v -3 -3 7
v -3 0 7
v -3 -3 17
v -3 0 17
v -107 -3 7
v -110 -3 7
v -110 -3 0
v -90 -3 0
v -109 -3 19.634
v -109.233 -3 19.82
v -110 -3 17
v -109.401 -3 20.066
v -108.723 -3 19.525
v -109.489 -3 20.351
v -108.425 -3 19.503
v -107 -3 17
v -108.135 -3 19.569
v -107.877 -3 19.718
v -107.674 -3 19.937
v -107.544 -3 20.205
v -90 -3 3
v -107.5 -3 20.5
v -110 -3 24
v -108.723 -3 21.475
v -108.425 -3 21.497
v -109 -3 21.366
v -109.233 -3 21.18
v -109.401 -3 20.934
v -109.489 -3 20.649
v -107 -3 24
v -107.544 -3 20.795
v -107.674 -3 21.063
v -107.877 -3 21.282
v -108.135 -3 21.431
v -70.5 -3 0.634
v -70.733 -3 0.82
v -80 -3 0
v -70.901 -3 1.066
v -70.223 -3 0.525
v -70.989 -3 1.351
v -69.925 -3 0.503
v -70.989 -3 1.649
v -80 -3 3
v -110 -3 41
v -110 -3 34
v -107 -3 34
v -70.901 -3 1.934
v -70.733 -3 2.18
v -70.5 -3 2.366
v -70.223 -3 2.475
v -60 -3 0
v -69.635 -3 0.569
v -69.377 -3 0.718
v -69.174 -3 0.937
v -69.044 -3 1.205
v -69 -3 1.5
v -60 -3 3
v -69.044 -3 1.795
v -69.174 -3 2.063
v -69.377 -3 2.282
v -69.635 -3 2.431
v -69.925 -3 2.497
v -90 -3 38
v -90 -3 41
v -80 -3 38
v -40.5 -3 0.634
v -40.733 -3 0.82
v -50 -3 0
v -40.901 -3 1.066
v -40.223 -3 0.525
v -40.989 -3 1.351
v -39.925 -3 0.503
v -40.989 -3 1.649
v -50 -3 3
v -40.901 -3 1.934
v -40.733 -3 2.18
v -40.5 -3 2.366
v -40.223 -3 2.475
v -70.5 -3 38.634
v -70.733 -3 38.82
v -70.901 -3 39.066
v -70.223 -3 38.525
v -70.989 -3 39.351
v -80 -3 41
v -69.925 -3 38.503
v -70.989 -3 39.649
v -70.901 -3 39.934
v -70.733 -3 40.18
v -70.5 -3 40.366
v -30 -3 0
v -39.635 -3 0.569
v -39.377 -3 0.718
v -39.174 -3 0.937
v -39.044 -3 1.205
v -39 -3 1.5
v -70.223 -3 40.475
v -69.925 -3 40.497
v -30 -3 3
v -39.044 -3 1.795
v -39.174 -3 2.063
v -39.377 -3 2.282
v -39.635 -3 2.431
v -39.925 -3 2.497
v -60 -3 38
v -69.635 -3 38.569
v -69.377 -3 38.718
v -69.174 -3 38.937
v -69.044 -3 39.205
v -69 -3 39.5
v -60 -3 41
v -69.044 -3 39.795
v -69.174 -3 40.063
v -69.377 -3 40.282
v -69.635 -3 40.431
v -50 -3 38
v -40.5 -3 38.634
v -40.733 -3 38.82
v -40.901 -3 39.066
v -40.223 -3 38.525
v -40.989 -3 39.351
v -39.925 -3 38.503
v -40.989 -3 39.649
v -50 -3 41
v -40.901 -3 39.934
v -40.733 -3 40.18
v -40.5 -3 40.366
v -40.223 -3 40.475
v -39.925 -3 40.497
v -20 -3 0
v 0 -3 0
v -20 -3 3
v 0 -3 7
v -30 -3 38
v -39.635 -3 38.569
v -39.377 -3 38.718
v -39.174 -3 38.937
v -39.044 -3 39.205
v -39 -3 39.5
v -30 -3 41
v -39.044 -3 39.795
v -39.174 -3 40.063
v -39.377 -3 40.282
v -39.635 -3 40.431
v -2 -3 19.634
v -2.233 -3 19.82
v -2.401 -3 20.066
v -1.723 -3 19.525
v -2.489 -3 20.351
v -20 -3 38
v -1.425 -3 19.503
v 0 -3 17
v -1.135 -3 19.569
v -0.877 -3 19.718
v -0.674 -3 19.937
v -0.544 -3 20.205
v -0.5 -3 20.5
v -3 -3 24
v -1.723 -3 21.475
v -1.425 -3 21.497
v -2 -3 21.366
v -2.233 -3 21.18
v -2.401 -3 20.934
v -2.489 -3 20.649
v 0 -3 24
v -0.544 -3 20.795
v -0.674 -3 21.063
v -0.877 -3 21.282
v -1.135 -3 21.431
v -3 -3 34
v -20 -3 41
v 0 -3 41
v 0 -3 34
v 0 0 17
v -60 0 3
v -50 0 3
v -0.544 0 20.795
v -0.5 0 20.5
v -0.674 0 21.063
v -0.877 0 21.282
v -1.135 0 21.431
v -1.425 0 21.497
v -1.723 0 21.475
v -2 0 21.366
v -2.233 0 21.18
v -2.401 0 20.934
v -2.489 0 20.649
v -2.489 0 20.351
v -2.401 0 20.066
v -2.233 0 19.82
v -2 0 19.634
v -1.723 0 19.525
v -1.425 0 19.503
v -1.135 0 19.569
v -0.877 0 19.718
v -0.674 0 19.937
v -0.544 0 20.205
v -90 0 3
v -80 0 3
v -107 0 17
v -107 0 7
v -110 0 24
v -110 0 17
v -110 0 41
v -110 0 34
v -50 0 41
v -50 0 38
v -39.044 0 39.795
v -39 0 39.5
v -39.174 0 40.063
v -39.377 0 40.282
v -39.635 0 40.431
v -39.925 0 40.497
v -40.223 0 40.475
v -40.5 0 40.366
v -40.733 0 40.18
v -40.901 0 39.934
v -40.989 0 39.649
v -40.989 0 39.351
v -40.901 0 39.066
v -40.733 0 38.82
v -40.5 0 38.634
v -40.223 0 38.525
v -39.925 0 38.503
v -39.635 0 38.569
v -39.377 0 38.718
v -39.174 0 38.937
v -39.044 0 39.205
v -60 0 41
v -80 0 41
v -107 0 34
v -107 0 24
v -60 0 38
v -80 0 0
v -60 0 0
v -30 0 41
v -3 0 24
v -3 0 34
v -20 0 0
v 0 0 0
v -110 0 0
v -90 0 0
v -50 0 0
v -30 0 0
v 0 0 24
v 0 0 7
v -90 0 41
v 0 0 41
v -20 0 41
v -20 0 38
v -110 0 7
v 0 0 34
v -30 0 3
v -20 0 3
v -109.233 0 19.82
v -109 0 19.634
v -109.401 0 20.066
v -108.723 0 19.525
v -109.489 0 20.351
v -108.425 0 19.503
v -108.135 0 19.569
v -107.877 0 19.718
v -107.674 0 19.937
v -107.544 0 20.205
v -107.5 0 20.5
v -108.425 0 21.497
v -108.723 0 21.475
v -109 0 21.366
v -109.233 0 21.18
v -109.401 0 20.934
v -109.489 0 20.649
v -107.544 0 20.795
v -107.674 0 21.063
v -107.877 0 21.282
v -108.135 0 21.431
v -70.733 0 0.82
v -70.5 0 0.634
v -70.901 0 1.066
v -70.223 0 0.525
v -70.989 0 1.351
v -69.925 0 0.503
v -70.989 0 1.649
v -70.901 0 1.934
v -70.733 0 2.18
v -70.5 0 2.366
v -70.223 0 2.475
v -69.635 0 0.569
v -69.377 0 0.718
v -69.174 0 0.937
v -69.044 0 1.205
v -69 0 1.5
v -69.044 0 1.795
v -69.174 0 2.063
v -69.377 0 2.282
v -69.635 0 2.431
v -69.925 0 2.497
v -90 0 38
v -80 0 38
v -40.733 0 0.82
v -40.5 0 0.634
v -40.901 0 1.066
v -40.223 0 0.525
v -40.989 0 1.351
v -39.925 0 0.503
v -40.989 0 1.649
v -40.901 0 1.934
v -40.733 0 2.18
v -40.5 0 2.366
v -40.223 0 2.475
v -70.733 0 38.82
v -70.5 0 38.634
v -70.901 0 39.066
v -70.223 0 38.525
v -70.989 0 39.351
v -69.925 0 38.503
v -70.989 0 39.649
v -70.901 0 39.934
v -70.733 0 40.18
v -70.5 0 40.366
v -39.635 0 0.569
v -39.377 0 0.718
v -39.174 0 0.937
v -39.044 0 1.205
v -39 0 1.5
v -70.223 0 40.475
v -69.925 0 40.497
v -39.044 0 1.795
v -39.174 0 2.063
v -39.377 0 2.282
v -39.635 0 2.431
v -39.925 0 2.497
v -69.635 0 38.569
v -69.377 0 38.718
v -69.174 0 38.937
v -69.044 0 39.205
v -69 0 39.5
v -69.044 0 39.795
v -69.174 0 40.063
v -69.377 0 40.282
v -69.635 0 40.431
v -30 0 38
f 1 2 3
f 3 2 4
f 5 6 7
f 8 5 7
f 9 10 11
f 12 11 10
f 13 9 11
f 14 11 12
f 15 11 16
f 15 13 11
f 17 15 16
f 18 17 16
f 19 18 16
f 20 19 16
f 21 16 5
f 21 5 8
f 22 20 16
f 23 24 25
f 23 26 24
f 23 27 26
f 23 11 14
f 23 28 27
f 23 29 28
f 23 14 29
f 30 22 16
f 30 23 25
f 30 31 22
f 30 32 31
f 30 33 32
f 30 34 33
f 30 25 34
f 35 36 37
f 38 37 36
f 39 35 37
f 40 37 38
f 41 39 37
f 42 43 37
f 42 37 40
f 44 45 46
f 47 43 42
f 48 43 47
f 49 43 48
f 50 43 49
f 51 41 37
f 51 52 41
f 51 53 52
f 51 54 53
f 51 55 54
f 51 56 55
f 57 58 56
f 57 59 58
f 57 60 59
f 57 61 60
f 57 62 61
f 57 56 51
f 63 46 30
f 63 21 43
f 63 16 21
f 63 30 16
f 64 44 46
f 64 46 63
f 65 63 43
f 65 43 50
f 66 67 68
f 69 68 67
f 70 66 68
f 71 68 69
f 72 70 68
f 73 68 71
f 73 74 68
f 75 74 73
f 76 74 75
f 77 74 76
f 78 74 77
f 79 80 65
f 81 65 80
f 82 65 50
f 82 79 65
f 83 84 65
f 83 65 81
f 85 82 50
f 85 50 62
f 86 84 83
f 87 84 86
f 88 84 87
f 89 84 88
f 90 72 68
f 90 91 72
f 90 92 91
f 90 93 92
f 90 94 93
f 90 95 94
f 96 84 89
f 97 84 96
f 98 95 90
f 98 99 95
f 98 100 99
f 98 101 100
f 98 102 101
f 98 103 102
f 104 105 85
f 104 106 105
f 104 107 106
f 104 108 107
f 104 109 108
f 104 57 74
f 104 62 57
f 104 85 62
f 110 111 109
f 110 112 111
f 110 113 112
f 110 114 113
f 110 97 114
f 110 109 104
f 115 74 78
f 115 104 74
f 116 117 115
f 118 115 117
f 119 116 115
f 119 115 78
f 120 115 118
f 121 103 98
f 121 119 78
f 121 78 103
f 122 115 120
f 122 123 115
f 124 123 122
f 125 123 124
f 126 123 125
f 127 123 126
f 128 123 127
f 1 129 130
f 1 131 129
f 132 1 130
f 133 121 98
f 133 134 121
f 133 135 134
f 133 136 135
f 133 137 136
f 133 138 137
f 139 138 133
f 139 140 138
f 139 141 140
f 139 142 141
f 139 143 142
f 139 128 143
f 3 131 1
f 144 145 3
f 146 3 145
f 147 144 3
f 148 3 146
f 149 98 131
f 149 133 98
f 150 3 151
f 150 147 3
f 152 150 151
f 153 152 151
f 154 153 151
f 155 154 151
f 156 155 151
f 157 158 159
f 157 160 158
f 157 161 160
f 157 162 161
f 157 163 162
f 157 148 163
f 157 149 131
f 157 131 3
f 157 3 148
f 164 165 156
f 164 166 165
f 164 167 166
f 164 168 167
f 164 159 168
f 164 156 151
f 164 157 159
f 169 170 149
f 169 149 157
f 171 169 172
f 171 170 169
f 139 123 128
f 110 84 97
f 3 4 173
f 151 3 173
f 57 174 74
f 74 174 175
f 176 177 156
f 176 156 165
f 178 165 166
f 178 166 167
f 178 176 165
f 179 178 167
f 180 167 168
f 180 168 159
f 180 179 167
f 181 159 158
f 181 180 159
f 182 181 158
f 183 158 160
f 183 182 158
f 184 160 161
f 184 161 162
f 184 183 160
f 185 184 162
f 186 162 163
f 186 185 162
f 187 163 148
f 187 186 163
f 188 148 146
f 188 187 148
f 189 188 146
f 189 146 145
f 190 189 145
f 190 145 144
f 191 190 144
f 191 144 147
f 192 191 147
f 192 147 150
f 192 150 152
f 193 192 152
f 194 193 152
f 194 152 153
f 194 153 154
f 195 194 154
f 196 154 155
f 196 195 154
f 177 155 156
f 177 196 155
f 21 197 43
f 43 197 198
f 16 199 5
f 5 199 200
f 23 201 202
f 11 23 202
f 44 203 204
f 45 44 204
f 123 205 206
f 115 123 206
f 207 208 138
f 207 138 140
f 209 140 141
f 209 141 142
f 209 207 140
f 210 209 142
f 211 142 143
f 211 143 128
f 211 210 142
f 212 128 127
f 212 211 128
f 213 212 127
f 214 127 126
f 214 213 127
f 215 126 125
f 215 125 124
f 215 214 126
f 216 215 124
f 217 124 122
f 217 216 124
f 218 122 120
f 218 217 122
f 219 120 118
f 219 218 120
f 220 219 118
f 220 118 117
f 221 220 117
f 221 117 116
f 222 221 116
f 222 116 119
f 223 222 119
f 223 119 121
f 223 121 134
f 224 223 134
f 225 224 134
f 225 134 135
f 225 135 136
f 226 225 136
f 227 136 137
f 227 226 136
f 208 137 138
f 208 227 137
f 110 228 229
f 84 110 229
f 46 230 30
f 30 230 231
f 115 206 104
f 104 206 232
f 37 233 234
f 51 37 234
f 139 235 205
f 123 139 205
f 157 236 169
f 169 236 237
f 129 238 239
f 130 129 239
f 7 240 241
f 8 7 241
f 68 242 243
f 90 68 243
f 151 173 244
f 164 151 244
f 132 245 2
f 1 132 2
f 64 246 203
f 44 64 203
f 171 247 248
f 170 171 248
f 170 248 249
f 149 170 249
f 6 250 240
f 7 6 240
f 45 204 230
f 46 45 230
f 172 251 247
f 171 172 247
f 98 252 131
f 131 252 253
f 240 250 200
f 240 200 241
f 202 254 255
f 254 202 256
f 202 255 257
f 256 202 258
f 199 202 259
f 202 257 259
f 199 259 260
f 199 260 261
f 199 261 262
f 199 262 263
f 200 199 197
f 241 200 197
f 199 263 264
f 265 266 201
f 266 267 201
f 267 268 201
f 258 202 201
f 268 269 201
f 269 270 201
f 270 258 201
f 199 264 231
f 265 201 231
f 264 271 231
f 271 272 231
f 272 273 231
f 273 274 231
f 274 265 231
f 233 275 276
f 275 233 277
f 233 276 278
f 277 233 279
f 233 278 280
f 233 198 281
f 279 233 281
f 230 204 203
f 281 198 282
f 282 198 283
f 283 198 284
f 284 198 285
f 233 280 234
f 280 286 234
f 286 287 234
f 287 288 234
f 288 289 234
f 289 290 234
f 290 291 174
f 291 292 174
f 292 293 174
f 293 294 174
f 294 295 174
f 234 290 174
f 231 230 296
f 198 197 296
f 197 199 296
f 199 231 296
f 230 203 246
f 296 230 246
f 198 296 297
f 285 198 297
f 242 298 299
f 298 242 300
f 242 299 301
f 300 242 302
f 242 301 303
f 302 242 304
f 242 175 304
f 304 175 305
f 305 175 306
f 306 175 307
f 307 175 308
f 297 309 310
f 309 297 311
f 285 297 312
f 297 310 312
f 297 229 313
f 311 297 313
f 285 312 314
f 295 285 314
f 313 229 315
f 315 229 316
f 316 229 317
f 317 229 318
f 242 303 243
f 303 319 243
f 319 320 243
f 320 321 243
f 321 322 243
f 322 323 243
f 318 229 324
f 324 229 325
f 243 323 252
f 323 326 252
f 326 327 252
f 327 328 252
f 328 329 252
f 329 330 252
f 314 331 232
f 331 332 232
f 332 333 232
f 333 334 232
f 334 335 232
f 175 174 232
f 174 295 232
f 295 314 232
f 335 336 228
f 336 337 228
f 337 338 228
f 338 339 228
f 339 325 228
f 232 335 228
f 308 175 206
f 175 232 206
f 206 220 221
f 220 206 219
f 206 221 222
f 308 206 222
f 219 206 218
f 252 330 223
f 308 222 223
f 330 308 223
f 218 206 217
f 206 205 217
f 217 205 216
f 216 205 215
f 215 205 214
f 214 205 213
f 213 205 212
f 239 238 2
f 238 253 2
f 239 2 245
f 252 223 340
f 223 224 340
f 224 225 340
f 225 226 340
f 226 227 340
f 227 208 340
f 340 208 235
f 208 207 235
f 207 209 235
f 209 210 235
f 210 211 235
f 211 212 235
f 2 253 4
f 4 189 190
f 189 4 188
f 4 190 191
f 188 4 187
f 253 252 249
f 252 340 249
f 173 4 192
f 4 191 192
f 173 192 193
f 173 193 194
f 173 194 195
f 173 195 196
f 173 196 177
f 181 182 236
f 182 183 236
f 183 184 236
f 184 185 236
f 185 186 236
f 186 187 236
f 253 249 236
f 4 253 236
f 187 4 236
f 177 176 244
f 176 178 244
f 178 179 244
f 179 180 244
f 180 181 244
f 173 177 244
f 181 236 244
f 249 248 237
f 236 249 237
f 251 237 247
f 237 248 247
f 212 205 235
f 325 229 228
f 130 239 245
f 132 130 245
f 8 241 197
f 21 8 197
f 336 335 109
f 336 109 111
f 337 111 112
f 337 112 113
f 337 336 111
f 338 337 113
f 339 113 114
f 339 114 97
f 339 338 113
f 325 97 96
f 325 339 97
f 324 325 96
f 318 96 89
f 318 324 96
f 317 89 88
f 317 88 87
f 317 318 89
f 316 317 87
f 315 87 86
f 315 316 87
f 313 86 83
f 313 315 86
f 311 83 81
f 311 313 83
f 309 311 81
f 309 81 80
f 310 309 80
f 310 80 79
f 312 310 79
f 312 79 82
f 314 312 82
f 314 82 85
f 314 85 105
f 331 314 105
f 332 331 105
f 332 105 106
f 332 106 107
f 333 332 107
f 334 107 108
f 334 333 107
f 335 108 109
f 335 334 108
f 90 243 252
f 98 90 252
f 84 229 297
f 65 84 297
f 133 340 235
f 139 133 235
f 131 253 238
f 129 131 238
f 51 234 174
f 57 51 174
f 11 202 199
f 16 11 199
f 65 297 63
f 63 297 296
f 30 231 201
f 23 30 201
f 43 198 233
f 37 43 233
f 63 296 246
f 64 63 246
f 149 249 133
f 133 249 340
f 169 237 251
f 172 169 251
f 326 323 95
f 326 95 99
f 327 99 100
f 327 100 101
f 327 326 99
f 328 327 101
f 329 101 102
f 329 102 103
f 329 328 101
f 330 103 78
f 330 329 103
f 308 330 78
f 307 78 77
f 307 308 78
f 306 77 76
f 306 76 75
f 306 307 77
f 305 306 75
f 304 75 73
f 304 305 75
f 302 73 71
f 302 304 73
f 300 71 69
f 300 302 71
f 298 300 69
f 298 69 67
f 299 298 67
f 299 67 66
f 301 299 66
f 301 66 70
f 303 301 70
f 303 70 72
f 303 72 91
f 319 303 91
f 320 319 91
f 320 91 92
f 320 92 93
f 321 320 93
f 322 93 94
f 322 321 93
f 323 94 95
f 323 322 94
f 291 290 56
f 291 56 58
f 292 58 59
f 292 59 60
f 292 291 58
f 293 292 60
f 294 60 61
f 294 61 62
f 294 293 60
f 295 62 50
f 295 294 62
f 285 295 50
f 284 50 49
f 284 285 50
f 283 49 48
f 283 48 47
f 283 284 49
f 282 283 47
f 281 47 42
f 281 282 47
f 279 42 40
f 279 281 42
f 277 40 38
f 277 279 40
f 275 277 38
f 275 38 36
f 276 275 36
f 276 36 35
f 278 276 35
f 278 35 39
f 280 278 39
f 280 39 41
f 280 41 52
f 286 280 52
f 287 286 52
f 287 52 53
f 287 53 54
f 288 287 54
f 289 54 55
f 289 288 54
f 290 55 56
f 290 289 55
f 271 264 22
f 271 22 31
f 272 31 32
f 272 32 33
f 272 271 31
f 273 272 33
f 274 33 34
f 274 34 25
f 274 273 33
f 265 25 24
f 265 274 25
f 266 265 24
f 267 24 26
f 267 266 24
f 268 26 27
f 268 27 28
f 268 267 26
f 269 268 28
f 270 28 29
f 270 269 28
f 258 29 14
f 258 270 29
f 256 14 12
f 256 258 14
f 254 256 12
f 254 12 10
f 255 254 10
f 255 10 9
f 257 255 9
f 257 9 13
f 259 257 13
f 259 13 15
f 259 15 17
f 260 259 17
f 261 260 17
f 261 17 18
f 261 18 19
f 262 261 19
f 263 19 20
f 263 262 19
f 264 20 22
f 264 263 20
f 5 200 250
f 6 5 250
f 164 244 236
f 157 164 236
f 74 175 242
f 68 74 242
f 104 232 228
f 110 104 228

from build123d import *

# Parameters (mm, degrees)
F0_R     = 1
F1_DEPTH = 3


with BuildPart() as f1:
    # F0 (on Front) → F1 (new body)
    with BuildSketch(Plane.XZ):
        Polygon((-20, 0), (0, 0), (0, 7), (-3, 7), (-3, 17), (0, 17), (0, 24), (-3, 24), (-3, 34), (0, 34), (0, 41), (-20, 41), (-20, 38), (-30, 38), (-30, 41), (-50, 41), (-50, 38), (-55, 38), (-60, 38), (-60, 41), (-80, 41), (-80, 38), (-90, 38), (-90, 41), (-110, 41), (-110, 34), (-107, 34), (-107, 24), (-110, 24), (-110, 17), (-107, 17), (-107, 7), (-110, 7), (-110, 0), (-90, 0), (-90, 3), (-80, 3), (-80, 0), (-60, 0), (-60, 3), (-55, 3), (-50, 3), (-50, 0), (-30, 0), (-30, 3), (-20, 3), align=None)
        with Locations((-70, 1.5)):
            Circle(F0_R, mode=Mode.SUBTRACT)
        with Locations((-40, 1.5)):
            Circle(F0_R, mode=Mode.SUBTRACT)
        with Locations((-108.5, 20.5)):
            Circle(F0_R, mode=Mode.SUBTRACT)
        with Locations((-70, 39.5)):
            Circle(F0_R, mode=Mode.SUBTRACT)
        with Locations((-1.5, 20.5)):
            Circle(F0_R, mode=Mode.SUBTRACT)
        with Locations((-40, 39.5)):
            Circle(F0_R, mode=Mode.SUBTRACT)
    extrude(amount=F1_DEPTH)


solid = f1.part
